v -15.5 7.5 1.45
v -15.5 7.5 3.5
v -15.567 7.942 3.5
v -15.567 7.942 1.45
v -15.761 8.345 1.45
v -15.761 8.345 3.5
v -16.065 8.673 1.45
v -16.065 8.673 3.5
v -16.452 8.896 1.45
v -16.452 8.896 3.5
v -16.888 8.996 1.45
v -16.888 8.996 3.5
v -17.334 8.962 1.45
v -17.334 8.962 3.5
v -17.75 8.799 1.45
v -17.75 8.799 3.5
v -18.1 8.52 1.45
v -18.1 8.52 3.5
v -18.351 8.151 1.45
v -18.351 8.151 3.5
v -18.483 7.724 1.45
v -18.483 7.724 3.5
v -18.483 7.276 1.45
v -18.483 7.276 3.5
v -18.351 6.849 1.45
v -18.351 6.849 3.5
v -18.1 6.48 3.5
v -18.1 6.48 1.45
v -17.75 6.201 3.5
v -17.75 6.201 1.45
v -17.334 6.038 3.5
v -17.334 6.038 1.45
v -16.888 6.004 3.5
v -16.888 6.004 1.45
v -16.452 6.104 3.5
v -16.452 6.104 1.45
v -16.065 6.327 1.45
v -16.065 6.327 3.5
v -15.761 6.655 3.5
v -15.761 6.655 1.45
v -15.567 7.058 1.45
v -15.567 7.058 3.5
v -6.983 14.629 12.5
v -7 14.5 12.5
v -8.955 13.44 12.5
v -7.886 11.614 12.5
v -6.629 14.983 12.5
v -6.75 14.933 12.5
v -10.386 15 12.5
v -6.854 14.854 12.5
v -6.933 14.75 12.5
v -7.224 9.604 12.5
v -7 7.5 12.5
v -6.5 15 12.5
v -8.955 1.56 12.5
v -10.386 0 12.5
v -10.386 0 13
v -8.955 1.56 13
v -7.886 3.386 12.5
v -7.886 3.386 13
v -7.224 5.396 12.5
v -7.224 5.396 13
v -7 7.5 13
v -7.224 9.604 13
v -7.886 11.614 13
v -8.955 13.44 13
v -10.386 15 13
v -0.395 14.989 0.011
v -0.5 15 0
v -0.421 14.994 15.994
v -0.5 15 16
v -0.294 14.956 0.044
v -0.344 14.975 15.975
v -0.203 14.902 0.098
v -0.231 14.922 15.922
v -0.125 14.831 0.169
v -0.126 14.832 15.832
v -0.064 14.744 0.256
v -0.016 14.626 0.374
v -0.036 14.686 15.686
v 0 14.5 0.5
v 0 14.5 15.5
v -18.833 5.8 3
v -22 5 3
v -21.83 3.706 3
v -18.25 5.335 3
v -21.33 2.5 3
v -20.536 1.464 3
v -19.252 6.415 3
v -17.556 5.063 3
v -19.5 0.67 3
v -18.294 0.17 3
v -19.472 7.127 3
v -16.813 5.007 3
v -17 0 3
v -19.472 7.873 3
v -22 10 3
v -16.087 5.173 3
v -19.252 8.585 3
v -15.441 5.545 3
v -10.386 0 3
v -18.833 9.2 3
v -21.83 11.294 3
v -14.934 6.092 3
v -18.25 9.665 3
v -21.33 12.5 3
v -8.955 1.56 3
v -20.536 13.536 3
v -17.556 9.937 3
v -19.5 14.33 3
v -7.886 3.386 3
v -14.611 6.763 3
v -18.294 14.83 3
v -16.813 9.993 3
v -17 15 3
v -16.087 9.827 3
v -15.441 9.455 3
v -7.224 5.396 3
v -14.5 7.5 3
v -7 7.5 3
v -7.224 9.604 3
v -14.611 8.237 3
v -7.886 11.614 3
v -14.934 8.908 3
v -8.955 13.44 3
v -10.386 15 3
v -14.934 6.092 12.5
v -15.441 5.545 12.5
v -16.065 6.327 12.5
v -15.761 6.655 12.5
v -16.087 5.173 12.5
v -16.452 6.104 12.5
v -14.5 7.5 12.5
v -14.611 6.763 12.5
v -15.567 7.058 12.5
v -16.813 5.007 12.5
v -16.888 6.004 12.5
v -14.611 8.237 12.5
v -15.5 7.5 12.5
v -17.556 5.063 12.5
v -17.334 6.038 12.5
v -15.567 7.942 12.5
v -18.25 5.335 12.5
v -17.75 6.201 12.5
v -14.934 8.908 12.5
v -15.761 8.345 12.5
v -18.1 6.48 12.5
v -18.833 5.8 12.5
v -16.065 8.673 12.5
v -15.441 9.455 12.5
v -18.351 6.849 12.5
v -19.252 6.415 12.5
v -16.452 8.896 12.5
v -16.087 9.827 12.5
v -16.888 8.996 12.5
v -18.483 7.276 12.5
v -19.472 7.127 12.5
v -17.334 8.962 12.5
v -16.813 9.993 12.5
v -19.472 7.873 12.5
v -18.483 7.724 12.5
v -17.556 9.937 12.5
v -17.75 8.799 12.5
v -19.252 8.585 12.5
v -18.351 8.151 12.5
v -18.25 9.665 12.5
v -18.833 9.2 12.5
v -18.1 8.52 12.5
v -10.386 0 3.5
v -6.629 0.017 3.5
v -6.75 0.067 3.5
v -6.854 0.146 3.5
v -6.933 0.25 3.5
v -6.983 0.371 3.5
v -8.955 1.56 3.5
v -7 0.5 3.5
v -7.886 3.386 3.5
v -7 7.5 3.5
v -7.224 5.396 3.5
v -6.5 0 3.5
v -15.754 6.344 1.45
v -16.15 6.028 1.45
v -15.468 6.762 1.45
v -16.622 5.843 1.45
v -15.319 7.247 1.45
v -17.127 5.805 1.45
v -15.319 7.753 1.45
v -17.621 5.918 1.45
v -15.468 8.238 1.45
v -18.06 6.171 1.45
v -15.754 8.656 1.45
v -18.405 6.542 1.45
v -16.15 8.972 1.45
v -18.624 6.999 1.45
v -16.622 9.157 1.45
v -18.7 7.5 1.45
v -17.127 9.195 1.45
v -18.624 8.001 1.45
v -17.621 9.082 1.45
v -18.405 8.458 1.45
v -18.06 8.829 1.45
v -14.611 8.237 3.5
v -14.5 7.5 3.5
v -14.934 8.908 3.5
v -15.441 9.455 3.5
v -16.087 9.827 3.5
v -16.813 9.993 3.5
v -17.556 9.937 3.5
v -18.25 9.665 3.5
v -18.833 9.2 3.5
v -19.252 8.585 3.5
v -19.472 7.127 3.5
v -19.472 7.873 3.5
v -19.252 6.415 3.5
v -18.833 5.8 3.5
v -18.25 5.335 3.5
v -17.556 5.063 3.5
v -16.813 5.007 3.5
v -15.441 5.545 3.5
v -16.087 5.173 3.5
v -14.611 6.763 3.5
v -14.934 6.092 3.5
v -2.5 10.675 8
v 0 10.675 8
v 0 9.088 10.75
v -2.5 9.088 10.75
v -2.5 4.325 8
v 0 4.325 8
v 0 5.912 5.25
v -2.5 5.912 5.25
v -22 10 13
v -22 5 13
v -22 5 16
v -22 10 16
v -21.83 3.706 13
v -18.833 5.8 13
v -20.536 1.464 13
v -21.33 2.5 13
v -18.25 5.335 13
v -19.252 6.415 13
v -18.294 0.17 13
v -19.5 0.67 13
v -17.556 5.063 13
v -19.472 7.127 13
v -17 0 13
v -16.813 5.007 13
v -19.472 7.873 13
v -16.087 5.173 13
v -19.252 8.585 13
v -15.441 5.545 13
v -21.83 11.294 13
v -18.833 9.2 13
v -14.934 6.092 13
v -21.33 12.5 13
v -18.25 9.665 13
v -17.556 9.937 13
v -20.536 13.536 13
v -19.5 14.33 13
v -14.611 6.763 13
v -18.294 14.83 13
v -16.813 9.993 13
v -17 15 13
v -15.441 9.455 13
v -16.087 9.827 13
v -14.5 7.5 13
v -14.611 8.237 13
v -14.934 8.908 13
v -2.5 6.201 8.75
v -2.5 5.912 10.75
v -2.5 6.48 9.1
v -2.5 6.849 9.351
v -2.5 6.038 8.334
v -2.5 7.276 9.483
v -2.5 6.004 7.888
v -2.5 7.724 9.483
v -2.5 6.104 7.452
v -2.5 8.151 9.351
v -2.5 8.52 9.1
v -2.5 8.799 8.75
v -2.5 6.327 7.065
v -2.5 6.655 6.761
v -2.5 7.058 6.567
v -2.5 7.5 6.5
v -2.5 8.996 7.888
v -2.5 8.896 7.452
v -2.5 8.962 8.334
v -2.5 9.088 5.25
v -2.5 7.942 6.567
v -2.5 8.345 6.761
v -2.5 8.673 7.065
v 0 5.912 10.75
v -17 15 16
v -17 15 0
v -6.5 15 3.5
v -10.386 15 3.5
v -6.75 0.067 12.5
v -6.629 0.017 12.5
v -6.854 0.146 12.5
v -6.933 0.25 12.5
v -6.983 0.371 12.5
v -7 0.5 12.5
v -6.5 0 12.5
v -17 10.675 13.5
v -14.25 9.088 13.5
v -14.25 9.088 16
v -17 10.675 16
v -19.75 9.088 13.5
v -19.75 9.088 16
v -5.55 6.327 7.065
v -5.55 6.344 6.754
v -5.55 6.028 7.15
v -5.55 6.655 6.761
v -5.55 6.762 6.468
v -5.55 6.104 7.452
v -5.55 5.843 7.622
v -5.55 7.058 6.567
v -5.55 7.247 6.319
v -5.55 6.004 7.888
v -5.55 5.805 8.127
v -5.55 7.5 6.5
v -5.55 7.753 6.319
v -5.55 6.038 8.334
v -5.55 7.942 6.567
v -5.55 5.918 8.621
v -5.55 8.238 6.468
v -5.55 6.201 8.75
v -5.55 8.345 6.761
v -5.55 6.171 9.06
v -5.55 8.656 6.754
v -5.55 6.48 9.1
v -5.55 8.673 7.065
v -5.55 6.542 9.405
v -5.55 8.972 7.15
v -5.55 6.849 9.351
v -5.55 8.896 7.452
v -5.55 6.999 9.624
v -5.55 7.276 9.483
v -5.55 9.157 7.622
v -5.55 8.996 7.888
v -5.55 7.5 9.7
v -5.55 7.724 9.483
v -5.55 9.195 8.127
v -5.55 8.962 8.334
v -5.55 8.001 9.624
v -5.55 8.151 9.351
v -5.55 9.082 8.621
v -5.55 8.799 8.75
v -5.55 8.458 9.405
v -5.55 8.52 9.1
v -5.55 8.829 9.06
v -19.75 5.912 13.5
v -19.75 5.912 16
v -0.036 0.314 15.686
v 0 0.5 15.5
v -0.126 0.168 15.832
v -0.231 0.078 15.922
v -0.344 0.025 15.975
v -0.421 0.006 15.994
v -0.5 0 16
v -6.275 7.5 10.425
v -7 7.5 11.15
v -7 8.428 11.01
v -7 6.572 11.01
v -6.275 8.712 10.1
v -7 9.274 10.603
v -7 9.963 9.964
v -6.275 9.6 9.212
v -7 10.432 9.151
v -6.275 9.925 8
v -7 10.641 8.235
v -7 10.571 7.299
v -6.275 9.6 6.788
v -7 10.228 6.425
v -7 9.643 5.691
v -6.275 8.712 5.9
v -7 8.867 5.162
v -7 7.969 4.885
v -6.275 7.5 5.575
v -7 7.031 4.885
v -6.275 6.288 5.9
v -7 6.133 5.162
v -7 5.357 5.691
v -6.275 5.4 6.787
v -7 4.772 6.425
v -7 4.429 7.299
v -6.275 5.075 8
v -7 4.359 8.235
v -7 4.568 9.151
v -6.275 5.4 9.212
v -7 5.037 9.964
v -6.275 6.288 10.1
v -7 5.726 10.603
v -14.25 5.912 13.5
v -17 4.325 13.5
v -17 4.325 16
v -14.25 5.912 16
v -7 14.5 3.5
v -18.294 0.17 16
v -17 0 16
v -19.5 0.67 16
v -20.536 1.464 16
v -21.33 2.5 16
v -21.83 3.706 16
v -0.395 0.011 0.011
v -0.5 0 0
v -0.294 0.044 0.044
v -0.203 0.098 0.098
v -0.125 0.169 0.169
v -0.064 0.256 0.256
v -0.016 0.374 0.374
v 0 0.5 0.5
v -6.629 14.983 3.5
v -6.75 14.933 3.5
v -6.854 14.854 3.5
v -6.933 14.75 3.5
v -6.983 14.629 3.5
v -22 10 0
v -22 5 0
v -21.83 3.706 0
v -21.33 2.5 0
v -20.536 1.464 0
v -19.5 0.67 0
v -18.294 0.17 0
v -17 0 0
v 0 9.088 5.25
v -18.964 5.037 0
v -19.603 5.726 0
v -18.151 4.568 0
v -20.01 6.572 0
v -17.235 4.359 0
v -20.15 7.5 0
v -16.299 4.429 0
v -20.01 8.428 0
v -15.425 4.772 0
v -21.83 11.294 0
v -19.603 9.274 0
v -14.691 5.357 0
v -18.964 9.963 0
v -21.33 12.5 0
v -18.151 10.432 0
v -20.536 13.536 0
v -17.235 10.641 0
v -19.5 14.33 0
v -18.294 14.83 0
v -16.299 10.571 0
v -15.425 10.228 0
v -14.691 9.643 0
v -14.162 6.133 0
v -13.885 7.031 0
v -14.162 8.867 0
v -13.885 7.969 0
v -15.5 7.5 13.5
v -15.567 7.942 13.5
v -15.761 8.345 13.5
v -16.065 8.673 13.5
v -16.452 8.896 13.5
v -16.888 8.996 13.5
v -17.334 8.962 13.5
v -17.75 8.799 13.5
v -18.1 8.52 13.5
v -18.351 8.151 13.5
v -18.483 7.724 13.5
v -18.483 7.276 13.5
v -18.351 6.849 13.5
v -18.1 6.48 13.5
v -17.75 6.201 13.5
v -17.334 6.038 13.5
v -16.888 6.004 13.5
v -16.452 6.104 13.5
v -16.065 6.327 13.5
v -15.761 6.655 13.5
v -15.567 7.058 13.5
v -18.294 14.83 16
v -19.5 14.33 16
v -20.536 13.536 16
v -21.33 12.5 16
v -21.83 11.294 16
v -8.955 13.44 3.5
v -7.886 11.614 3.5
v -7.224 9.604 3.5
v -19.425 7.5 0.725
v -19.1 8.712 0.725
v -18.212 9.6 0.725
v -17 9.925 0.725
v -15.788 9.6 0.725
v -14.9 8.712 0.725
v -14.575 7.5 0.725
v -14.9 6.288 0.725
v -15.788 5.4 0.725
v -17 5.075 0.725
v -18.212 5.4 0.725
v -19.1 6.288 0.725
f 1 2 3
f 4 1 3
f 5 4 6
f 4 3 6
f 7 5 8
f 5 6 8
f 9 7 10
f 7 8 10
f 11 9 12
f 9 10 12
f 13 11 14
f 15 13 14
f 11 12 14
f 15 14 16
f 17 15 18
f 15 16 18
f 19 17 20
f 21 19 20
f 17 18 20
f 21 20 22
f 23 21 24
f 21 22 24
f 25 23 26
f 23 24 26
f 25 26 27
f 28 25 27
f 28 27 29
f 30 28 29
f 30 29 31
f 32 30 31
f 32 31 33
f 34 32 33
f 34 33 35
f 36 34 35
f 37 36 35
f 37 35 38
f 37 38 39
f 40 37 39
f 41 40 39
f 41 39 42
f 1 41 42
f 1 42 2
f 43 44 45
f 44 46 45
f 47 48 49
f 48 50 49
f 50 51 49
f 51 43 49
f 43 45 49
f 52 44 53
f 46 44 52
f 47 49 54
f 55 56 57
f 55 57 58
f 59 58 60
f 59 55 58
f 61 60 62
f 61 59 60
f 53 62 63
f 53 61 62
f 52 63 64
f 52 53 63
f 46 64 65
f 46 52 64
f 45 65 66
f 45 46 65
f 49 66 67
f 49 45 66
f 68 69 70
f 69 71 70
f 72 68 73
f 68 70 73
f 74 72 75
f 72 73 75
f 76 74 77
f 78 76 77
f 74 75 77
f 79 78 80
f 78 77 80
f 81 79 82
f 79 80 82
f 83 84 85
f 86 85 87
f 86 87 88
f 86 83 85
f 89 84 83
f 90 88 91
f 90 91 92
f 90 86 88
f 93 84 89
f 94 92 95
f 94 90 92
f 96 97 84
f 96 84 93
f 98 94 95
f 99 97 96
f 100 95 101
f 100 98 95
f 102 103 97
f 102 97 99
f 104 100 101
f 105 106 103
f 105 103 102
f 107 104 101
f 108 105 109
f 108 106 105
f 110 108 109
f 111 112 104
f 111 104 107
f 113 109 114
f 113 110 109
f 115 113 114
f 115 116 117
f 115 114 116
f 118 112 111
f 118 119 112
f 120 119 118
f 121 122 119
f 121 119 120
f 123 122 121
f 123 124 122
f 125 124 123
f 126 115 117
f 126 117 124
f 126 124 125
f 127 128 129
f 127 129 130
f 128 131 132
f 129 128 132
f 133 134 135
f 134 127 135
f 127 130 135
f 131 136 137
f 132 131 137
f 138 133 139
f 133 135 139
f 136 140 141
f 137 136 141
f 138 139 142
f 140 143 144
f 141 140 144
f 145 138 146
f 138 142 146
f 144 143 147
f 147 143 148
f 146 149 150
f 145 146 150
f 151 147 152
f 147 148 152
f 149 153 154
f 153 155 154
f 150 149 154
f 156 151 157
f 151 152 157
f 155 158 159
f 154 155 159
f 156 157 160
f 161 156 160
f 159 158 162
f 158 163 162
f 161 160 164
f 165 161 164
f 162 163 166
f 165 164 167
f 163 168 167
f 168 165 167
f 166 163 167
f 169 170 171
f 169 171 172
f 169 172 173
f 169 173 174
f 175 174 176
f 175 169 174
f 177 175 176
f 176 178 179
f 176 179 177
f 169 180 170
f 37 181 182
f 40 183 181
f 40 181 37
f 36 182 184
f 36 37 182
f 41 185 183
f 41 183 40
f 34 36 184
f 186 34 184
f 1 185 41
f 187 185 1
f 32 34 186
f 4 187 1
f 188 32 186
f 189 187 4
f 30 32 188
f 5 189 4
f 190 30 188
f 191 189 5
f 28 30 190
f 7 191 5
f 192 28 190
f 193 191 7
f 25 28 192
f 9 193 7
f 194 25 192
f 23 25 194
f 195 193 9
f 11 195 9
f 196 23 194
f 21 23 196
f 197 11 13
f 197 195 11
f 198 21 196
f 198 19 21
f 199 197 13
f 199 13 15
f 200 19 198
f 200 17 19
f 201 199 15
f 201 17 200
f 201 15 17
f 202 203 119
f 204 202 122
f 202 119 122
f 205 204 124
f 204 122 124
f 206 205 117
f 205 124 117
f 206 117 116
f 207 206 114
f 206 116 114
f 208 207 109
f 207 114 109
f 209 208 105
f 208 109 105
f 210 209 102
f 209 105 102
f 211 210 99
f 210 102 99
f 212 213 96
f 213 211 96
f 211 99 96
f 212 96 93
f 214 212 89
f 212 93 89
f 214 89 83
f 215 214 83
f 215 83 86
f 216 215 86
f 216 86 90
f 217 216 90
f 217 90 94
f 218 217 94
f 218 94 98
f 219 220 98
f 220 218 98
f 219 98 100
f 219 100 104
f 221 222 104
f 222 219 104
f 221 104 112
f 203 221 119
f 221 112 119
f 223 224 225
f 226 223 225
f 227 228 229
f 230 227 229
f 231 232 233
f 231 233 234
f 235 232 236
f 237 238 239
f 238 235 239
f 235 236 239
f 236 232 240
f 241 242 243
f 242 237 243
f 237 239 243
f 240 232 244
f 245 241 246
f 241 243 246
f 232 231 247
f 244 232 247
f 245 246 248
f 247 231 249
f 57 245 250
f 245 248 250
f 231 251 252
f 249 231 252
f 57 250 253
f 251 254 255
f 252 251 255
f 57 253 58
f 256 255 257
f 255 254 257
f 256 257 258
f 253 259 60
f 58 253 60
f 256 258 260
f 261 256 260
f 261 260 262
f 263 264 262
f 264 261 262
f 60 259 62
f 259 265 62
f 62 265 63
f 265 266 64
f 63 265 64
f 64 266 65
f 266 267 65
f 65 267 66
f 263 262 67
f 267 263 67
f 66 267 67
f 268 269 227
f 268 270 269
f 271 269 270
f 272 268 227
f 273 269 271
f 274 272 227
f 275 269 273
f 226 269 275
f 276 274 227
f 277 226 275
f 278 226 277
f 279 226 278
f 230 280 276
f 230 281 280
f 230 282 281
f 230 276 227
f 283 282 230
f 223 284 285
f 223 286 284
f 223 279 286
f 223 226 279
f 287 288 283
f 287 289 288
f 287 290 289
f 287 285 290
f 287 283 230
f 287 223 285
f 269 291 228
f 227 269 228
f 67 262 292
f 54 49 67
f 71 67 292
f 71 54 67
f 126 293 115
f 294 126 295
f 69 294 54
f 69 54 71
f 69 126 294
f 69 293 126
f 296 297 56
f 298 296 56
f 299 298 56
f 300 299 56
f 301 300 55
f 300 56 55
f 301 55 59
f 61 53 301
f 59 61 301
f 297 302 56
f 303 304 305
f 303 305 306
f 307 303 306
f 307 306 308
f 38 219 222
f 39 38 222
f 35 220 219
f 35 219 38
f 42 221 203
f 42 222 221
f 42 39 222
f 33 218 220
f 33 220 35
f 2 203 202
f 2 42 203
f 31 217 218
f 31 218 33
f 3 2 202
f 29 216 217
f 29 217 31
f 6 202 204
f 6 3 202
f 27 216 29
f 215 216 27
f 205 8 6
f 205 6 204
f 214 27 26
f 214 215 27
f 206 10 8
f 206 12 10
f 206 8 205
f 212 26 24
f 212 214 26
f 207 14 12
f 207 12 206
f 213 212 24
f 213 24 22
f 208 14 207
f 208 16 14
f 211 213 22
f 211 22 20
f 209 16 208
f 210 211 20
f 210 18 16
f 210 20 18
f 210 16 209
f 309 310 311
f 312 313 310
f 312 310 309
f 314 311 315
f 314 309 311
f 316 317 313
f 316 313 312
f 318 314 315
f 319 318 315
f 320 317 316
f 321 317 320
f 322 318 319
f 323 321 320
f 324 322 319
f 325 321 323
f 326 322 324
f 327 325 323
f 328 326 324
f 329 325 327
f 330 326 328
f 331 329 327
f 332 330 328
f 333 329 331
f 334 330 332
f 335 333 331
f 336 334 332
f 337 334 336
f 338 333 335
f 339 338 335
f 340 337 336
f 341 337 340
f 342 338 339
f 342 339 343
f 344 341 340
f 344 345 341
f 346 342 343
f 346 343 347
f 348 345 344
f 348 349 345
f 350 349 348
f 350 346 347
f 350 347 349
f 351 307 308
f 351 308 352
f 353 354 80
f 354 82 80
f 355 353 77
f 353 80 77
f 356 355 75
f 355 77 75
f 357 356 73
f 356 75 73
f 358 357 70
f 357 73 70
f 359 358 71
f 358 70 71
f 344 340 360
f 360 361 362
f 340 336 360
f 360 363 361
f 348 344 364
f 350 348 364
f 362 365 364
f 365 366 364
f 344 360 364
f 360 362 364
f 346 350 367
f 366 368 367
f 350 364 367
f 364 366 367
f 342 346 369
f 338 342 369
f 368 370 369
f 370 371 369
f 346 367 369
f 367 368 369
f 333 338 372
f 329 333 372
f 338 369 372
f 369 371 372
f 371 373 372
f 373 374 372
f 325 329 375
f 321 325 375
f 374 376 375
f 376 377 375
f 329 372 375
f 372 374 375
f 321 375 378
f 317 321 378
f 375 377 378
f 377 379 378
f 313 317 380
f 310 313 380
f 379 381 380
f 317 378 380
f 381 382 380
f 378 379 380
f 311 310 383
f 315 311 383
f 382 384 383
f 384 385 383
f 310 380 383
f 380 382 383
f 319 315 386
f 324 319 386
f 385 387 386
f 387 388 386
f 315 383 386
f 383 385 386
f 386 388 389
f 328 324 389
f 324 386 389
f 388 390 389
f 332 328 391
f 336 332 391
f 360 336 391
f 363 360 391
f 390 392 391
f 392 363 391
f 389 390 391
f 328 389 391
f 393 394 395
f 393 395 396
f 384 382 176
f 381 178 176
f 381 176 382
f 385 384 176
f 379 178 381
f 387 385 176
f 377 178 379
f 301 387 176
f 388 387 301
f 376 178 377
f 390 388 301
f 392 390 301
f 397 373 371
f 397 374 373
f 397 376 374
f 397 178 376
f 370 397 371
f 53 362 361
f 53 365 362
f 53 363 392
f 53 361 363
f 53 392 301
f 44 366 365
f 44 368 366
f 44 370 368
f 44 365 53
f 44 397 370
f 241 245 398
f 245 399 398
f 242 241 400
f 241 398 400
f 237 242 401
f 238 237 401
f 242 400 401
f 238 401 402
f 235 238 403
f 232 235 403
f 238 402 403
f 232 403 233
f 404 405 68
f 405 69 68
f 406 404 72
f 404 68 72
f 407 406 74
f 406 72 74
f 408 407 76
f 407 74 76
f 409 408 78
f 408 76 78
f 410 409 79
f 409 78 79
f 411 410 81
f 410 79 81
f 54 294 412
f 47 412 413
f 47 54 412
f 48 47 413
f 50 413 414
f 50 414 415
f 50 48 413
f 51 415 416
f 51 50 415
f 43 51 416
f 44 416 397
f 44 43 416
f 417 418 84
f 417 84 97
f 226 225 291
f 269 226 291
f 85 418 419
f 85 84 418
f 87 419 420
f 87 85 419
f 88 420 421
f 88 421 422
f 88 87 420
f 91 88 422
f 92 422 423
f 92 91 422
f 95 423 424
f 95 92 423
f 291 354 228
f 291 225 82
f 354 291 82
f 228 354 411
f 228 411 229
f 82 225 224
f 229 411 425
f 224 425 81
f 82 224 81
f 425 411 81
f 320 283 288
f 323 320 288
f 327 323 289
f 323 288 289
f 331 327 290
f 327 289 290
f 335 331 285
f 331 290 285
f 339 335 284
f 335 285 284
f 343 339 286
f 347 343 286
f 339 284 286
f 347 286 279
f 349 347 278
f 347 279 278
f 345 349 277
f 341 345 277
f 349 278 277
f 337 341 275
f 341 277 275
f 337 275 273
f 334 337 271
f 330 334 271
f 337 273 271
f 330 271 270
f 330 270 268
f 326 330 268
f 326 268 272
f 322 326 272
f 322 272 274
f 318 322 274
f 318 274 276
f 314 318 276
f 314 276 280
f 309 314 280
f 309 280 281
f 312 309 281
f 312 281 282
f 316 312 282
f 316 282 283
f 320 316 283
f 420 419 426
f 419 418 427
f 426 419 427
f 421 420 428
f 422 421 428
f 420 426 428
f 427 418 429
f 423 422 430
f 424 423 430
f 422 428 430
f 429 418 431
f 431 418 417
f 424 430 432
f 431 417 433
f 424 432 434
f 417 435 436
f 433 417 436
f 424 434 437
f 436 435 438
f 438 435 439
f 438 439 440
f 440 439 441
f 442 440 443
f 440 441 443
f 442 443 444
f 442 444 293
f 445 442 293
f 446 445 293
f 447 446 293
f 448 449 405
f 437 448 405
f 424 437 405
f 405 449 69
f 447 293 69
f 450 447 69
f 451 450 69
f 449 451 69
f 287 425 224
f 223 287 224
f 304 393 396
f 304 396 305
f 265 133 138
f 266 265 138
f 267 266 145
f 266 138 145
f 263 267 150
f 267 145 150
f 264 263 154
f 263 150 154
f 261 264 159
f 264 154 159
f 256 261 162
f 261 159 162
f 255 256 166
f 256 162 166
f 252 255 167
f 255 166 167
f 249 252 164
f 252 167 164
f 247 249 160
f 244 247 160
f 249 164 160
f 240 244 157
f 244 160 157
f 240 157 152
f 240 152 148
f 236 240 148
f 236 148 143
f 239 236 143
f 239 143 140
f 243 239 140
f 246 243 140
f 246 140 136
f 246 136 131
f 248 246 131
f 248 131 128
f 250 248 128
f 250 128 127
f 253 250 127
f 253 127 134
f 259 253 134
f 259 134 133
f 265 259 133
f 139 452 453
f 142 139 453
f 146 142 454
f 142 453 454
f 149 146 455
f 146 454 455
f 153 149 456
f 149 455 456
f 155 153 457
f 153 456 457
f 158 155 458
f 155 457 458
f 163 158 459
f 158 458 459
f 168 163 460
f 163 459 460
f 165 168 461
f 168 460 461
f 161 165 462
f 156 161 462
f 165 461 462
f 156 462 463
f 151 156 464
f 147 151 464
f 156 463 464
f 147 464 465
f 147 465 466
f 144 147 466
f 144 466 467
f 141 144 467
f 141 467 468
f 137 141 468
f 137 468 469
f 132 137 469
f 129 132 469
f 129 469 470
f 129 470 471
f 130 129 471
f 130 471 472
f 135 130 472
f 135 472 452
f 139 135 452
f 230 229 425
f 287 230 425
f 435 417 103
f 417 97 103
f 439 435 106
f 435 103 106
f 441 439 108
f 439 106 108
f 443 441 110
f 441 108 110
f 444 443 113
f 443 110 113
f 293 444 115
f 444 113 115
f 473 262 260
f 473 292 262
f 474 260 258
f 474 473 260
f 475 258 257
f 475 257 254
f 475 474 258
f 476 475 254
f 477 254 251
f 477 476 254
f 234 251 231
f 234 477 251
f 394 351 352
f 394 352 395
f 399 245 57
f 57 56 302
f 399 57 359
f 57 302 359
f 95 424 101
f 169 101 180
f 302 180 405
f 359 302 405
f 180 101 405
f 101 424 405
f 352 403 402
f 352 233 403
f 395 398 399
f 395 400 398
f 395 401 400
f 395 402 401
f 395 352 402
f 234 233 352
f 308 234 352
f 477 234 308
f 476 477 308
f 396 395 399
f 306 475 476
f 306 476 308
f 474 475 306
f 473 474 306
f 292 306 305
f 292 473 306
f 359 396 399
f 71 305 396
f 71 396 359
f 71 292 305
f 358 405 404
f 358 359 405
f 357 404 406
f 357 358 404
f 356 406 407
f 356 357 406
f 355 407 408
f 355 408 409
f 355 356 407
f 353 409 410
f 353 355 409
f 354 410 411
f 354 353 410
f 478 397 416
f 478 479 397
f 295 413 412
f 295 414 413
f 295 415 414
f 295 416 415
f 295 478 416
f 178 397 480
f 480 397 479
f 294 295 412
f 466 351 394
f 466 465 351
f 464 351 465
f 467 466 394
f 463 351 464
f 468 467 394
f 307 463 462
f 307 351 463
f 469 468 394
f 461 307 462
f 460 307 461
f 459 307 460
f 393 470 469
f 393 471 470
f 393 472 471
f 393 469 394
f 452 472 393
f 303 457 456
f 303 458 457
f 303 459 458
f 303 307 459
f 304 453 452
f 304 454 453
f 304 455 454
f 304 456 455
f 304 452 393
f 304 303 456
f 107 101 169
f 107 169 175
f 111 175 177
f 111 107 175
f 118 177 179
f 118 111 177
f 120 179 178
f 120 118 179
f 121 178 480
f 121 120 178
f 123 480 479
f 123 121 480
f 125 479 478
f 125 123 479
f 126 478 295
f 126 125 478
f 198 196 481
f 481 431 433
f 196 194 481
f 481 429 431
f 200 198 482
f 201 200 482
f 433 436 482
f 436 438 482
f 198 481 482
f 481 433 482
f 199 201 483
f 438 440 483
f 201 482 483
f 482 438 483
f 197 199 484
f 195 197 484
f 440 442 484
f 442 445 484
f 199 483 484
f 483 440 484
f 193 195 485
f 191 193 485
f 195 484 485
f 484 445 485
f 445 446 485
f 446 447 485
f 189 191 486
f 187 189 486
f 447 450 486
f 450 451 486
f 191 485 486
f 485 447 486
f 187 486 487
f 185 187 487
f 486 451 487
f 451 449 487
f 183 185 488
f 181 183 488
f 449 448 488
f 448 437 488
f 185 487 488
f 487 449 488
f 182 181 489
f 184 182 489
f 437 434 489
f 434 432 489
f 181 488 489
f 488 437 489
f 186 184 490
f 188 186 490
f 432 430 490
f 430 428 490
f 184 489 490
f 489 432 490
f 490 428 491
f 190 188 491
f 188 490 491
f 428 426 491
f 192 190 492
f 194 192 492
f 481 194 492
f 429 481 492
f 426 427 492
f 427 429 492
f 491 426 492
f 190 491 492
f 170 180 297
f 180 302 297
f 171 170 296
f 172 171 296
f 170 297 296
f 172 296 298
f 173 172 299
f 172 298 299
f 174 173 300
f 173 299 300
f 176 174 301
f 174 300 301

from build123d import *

# Parameters (mm, degrees)
SKETCH1_W                = 22
SKETCH1_H                = 15
BOSS_EXTRUDE1_DEPTH      = 16
SKETCH2_R                = 1.5
CUT_EXTRUDE1_DEPTH       = 32.064449134
CUT_EXTRUDE2_DEPTH       = 5
CUT_EXTRUDE2_DEPTH_BACK  = 5
SKETCH3_R                = 10
SKETCH3_R_2              = 2.5
SKETCH4_W                = 9
SKETCH4_H                = 15
CUT_EXTRUDE3_DEPTH       = 15
SKETCH10_R               = 1.5
CUT_EXTRUDE5_DEPTH       = 32.064449134
SKETCH11_R               = 3.15
CUT_EXTRUDE6_DEPTH       = 1.45
CUT_EXTRUDE6_DRAFT       = -45
CUT_EXTRUDE8_DEPTH       = 2.5
FILLET1_R                = 5
FILLET2_R                = 0.5
SKETCH9_R                = 3.15
CUT_EXTRUDE10_DEPTH      = 1.45
CUT_EXTRUDE10_DRAFT      = -45
CUT_EXTRUDE12_DEPTH      = 1
CUT_EXTRUDE12_DEPTH_BACK = 2.5


with BuildPart() as part:
    # Sketch1 → Boss-Extrude1 (new body)
    with BuildSketch(Plane.XY):
        with Locations((-11, 7.5)):
            Rectangle(SKETCH1_W, SKETCH1_H)
    extrude(amount=BOSS_EXTRUDE1_DEPTH)

    # Sketch2 → Cut-Extrude1 (cut, through all)
    with BuildSketch(Plane.XY.offset(16)):
        with Locations((-17, 7.5)):
            Circle(SKETCH2_R)
    extrude(amount=-CUT_EXTRUDE1_DEPTH, mode=Mode.SUBTRACT)

    # Sketch3 → Cut-Extrude2 (cut, two sides: drawn at the far end of the back side and taken through both)
    with BuildSketch(Plane.XY.offset(8).offset(-CUT_EXTRUDE2_DEPTH_BACK)):
        with Locations((-17, 7.5)):
            Circle(SKETCH3_R)
        with Locations((-17, 7.5)):
            Circle(SKETCH3_R_2, mode=Mode.SUBTRACT)
    extrude(amount=CUT_EXTRUDE2_DEPTH + CUT_EXTRUDE2_DEPTH_BACK, mode=Mode.SUBTRACT)

    # Sketch4 → Cut-Extrude3 (cut)
    with BuildSketch(Plane.ZY.offset(22)):
        with Locations((8, 7.5)):
            Rectangle(SKETCH4_W, SKETCH4_H)
    extrude(amount=-CUT_EXTRUDE3_DEPTH, mode=Mode.SUBTRACT)

    # Sketch10 → Cut-Extrude5 (cut, through all)
    with BuildSketch(Plane(origin=(0, 0, 0), x_dir=(0, 0, -1), z_dir=(1, 0, 0))):
        with Locations((-8, 7.5)):
            Circle(SKETCH10_R)
    extrude(amount=-CUT_EXTRUDE5_DEPTH, mode=Mode.SUBTRACT)


with BuildPart() as cut_extrude6_tool:
    # Sketch11 → Cut-Extrude6 (with draft: the straight prism first)
    with BuildSketch(Plane.ZY.offset(7)):
        with Locations((8, 7.5)):
            Circle(SKETCH11_R)
    extrude(amount=-CUT_EXTRUDE6_DEPTH)
    # Cut-Extrude6: the draft: its side faces are tilted about the plane it starts from
    cut_extrude6_sides = [cut_extrude6_tool.faces().sort_by_distance(p)[0] for p in [
        (-6.275, 7.5, 4.85),
    ]]
    draft(cut_extrude6_sides, Plane.ZY.offset(7), CUT_EXTRUDE6_DRAFT)


with BuildPart() as part_1:
    add(part.part)

    # Cut-Extrude6: cut by cut_extrude6_tool
    add(cut_extrude6_tool.part, mode=Mode.SUBTRACT)

    # Sketch13 → Cut-Extrude8 (cut)
    with BuildSketch(Plane(origin=(0, 0, 0), x_dir=(0, 0, -1), z_dir=(1, 0, 0))):
        Polygon((-5.250369343, 9.0875), (-8, 10.675), (-10.749630657, 9.0875), (-10.749630657, 5.9125), (-8, 4.325), (-5.250369343, 5.9125), align=None)
    extrude(amount=-CUT_EXTRUDE8_DEPTH, mode=Mode.SUBTRACT)

    # Fillet1
    fillet1_edges = [part_1.edges().sort_by_distance(p)[0] for p in [
        (-22, 0, 1.5),
        (-22, 15, 1.5),
        (-22, 0, 14.5),
        (-22, 15, 14.5),
    ]]
    fillet(fillet1_edges, radius=FILLET1_R)

    # Fillet2
    fillet2_edges = [part_1.edges().sort_by_distance(p)[0] for p in [
        (0, 7.5, 16),
        (-7, 15, 8),
        (-7, 0, 8),
        (0, 7.5, 0),
        (0, 0, 8),
        (0, 15, 8),
    ]]
    fillet(fillet2_edges, radius=FILLET2_R)


with BuildPart() as cut_extrude10_tool:
    # Sketch9 → Cut-Extrude10 (with draft: the straight prism first)
    with BuildSketch(Plane(origin=(0, 0, 0), x_dir=(-1, 0, 0), z_dir=(0, 0, -1))):
        with Locations((17, 7.5)):
            Circle(SKETCH9_R)
    extrude(amount=-CUT_EXTRUDE10_DEPTH)
    # Cut-Extrude10: the draft: its side faces are tilted about the plane it starts from
    cut_extrude10_sides = [cut_extrude10_tool.faces().sort_by_distance(p)[0] for p in [
        (-13.85, 7.5, 0.725),
    ]]
    draft(cut_extrude10_sides, Plane(origin=(0, 0, 0), x_dir=(-1, 0, 0), z_dir=(0, 0, -1)), CUT_EXTRUDE10_DRAFT)


with BuildPart() as part_2:
    add(part_1.part)

    # Cut-Extrude10: cut by cut_extrude10_tool
    add(cut_extrude10_tool.part, mode=Mode.SUBTRACT)

    # Sketch12 → Cut-Extrude12 (cut, two sides: drawn at the far end of the back side and taken through both)
    with BuildSketch(Plane.XY.offset(16).offset(-CUT_EXTRUDE12_DEPTH_BACK)):
        Polygon((-14.250369343, 9.0875), (-17, 10.675), (-19.749630657, 9.0875), (-19.749630657, 5.9125), (-17, 4.325), (-14.250369343, 5.9125), align=None)
    extrude(amount=CUT_EXTRUDE12_DEPTH + CUT_EXTRUDE12_DEPTH_BACK, mode=Mode.SUBTRACT)


solid = part_2.part
